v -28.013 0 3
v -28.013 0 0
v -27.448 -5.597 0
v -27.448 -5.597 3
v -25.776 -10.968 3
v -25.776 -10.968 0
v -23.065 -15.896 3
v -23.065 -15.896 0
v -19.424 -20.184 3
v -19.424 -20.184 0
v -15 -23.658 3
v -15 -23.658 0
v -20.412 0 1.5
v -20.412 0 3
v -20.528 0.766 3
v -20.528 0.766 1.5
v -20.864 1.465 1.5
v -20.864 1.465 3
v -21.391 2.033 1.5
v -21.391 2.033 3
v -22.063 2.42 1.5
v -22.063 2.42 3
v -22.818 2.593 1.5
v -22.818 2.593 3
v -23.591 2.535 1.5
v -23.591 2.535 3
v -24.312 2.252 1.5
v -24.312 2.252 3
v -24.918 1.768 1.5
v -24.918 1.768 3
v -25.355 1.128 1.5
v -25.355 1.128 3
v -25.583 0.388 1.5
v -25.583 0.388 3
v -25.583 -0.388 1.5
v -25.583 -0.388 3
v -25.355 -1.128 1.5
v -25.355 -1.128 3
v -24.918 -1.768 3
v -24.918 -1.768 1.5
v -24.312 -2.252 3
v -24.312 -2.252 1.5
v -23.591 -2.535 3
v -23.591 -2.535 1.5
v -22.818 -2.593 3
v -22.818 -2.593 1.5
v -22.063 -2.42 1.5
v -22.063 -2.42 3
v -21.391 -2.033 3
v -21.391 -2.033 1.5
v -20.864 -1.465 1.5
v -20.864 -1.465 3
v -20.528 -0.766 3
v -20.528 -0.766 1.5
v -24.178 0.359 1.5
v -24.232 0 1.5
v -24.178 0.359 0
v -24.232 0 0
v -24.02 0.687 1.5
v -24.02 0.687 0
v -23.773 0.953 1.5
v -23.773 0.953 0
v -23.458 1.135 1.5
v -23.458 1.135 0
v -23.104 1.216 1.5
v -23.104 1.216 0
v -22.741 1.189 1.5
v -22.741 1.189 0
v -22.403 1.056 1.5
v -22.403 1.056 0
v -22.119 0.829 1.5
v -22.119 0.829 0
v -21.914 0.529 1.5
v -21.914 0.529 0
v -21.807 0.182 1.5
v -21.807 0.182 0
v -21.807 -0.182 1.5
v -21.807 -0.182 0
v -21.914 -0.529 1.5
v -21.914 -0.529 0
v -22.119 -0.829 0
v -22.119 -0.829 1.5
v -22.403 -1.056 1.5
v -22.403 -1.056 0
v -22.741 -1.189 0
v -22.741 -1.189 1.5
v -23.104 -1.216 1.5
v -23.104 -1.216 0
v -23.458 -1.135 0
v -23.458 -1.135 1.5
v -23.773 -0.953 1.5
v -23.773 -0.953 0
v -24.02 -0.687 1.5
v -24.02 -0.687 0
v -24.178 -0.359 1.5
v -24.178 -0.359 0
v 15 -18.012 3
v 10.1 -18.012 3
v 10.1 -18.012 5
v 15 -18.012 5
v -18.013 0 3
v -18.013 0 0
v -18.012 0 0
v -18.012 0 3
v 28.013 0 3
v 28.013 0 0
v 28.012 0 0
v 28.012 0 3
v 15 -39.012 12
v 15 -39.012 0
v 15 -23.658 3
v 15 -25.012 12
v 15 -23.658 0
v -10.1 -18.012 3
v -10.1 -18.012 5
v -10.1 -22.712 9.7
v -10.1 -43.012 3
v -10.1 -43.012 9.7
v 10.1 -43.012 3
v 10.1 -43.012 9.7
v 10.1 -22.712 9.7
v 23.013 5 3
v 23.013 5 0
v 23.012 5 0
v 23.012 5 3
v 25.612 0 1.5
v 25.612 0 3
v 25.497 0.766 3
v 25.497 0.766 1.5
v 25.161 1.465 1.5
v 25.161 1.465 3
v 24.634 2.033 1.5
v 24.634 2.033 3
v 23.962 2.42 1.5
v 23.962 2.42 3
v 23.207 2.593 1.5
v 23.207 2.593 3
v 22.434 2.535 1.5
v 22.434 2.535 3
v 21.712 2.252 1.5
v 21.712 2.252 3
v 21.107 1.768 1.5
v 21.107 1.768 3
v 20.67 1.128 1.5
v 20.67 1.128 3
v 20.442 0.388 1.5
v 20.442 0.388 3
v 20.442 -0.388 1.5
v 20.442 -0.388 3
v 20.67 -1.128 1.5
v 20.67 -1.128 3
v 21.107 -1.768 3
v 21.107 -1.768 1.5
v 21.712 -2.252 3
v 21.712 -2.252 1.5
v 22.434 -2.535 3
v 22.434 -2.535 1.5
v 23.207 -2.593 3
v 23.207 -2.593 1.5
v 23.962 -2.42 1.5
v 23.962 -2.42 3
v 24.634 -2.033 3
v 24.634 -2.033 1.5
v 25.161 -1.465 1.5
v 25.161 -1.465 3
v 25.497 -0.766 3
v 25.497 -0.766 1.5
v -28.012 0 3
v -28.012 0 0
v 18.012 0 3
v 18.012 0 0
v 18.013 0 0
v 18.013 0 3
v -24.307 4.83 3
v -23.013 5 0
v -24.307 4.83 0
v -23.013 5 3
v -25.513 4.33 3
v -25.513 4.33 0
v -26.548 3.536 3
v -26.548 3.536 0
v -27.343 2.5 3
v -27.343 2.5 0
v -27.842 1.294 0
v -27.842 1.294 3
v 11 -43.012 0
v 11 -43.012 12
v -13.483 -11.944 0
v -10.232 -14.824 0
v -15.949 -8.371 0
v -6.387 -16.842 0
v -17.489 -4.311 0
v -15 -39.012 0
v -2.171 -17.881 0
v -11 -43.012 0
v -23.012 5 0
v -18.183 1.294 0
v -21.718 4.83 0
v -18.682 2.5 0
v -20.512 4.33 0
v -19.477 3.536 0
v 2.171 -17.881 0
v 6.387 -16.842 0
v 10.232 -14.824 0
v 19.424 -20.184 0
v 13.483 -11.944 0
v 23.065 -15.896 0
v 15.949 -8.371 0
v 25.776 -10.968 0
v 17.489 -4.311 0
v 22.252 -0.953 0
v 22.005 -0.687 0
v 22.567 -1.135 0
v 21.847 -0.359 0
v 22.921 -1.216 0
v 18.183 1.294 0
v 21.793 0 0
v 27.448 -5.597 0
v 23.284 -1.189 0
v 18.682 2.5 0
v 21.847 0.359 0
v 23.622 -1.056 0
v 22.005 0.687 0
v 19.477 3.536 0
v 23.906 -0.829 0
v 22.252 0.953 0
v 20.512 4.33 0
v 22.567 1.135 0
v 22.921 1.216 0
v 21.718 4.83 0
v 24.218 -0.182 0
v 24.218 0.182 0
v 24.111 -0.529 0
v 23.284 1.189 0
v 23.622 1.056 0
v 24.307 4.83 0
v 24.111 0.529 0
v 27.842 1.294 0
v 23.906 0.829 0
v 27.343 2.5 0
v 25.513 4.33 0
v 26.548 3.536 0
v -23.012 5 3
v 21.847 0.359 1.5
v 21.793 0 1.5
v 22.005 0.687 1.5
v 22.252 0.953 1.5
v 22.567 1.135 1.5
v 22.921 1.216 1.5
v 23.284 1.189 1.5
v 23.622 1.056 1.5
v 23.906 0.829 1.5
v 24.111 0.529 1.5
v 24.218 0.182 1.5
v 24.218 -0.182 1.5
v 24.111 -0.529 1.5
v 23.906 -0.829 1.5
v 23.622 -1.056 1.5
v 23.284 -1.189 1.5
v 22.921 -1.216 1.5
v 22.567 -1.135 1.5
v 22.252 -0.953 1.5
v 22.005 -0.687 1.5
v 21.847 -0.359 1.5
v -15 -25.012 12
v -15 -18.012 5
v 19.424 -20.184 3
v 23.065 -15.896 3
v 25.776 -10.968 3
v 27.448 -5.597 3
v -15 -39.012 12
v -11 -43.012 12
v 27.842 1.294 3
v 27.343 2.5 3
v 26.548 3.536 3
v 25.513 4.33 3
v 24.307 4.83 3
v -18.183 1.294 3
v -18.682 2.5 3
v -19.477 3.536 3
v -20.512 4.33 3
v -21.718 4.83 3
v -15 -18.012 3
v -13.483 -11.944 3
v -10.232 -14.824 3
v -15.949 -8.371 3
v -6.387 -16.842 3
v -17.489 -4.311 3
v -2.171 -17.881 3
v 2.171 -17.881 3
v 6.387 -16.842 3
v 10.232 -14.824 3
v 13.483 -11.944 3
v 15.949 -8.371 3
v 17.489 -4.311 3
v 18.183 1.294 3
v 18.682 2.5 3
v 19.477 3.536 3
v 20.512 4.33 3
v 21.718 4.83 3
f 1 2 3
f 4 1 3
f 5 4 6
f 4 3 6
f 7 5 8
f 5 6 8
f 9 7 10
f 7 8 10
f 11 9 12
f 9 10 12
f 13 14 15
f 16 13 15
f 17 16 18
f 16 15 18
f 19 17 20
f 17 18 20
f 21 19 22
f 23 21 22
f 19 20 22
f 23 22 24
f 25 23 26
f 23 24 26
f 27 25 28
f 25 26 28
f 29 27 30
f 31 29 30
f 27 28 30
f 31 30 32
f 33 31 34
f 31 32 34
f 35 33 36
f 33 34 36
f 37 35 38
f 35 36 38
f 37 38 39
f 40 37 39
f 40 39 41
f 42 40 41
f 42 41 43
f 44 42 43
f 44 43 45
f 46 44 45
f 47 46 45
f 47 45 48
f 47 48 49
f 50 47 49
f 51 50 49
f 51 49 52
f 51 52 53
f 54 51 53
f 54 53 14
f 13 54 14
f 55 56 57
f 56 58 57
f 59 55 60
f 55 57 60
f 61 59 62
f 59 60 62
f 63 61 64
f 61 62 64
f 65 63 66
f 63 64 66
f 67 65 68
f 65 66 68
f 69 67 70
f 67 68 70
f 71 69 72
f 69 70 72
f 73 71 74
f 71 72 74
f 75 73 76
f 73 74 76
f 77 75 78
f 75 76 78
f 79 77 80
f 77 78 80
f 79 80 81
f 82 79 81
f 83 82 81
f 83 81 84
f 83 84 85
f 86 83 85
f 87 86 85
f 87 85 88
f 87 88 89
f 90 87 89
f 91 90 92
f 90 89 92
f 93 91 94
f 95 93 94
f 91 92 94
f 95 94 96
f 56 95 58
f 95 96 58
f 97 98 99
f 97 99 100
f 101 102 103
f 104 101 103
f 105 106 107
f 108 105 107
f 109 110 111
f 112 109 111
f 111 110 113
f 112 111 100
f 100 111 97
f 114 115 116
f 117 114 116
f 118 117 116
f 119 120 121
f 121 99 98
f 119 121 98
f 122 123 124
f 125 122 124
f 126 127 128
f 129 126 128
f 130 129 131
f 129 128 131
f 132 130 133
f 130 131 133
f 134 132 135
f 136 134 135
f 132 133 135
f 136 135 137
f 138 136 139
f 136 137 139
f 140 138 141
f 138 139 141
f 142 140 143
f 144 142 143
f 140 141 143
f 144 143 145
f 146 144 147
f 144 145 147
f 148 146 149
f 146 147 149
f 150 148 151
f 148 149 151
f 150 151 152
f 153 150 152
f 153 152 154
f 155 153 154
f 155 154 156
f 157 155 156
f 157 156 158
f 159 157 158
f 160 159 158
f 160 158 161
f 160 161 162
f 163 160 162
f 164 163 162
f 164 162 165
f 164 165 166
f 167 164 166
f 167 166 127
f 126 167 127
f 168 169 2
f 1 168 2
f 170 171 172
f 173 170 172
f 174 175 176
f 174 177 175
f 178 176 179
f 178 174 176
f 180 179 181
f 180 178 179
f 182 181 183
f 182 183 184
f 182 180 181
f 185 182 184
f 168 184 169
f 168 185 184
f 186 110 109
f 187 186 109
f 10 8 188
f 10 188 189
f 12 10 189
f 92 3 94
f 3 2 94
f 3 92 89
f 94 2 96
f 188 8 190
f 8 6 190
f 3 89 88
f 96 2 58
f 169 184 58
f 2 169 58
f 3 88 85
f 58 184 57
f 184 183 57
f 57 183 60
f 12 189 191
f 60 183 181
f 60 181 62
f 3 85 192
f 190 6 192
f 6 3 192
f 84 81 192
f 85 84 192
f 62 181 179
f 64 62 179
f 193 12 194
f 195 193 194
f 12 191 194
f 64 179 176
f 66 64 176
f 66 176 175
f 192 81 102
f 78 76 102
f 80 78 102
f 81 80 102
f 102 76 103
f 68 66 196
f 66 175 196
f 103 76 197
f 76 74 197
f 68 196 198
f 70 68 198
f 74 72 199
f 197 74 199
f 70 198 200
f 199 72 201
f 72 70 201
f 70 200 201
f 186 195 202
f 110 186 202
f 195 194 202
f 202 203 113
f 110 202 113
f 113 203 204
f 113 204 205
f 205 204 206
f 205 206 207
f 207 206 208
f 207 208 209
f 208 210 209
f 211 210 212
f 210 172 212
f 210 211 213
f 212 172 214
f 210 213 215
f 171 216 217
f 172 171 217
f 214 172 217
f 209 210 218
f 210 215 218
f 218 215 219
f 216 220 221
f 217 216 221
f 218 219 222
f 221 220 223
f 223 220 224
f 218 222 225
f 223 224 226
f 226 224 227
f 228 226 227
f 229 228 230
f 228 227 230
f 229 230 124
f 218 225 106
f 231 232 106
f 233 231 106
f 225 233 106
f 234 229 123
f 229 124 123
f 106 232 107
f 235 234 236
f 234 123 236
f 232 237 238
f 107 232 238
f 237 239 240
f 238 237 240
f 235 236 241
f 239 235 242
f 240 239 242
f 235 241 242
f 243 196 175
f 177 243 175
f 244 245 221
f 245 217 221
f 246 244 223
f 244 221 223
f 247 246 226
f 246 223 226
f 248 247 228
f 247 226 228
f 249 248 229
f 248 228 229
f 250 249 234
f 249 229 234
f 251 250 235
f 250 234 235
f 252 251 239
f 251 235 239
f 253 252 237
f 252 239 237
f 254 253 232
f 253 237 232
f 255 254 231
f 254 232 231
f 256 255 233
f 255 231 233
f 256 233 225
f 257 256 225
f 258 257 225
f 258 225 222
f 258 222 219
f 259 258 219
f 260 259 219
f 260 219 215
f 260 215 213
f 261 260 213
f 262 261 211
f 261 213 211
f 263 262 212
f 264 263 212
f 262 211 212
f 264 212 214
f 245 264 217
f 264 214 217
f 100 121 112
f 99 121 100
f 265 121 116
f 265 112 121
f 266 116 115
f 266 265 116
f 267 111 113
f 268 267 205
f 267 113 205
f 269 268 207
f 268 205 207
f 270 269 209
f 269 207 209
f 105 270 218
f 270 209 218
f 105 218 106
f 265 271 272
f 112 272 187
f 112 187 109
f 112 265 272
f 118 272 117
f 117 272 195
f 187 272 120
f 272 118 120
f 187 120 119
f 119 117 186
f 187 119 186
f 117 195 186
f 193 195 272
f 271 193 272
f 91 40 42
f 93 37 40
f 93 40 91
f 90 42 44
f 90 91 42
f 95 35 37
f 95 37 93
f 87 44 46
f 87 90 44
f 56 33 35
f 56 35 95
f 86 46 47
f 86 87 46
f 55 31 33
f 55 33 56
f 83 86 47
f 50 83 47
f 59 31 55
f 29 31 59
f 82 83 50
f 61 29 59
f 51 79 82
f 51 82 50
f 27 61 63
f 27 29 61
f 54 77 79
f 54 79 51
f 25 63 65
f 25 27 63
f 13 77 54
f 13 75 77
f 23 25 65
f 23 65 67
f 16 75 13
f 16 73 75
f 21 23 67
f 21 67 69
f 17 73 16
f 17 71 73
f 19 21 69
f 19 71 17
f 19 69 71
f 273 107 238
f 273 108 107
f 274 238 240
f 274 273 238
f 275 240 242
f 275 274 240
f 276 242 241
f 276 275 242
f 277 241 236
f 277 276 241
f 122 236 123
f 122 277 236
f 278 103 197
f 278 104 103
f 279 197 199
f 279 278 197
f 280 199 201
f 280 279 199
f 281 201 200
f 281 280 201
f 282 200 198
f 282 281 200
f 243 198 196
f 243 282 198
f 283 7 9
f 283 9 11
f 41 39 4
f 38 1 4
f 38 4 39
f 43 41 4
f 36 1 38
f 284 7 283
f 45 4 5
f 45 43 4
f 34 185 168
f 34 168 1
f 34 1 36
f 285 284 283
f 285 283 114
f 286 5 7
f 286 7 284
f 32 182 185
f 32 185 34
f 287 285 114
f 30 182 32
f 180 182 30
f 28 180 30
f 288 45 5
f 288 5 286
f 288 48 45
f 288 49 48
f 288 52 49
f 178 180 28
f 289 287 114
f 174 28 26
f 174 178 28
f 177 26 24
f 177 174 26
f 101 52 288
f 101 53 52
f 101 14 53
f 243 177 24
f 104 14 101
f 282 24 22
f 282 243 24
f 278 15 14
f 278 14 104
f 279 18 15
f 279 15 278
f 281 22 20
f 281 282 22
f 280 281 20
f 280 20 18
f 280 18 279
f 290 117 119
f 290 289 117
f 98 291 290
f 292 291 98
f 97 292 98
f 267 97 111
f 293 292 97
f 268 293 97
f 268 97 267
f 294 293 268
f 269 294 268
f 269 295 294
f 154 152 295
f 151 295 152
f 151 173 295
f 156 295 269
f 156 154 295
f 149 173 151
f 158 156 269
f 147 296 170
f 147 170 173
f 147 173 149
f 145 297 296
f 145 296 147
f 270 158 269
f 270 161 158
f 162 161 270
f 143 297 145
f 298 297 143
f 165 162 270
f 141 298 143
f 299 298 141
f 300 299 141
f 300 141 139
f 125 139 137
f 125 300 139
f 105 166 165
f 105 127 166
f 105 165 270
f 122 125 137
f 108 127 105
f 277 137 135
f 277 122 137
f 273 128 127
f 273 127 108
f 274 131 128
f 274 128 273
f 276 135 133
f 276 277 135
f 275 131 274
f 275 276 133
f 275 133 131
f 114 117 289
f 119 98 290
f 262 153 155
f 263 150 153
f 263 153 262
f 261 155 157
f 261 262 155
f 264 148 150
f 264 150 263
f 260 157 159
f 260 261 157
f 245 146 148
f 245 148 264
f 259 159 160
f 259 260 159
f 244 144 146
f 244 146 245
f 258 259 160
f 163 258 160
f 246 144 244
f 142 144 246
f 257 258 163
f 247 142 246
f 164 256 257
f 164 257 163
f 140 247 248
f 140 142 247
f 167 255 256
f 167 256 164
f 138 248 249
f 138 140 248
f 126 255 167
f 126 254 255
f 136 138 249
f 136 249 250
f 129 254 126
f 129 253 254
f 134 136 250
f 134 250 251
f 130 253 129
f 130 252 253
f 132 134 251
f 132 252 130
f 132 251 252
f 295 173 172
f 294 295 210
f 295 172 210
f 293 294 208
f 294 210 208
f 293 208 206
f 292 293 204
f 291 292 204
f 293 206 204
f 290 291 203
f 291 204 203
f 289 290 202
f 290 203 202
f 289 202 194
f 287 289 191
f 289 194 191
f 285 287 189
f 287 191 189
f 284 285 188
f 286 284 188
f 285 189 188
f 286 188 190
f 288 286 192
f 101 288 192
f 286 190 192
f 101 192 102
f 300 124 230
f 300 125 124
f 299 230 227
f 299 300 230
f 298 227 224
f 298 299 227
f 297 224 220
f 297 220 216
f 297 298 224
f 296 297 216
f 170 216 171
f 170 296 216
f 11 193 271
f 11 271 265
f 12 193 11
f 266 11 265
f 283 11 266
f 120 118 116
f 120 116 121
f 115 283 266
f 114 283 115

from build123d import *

# Parameters (mm, degrees)
F1_DEPTH       = 3
F2_R           = 4.99999
F4_D           = 2.4384
F4_CBORE_D     = 5.2
F4_CBORE_DEPTH = 1.5
F5_W           = 30
F5_H           = 25
F6_DEPTH       = 12
F8_DEPTH       = 25.001
F9_T1_DEPTH    = 66.0035618315
F10_SIZE       = 4


# Not quite as in the source:
# - a fillet or chamfer that OpenCascade refuses, or shapes differently, is made with other operations: its cross-section is extruded or revolved along the edge and cut away or added
# - a fillet or chamfer is up to 0.001 mm smaller than in the source, because OpenCascade refuses the exact size


with BuildPart() as f1:
    # F0 (on Top) → F1 (new body)
    with BuildSketch(Plane.XY):
        with BuildLine():
            ThreePointArc((18.0125, 0), (0, -18.0125), (-18.0125, 0))
            Line((-18.0125, 0), (-18.0125, 5))
            Line((-18.0125, 5), (-28.0125, 5))
            Line((-28.0125, 5), (-28.0125, 0))
            ThreePointArc((-28.0125, 0), (0, -28.0125), (28.0125, 0))
            Line((28.0125, 0), (28.0125, 5))
            Line((28.0125, 5), (18.0125, 5))
            Line((18.0125, 5), (18.0125, 0))
        make_face()
    extrude(amount=F1_DEPTH)

    # F2 (radius 5 in the source; OpenCascade refuses exactly that, so slightly less here)
    f2_edges = [f1.edges().sort_by_distance(p)[0] for p in [
        (-28.0125, 5, 1.5),
        (-18.0125, 5, 1.5),
        (18.0125, 5, 1.5),
        (28.0125, 5, 1.5),
    ]]
    fillet(f2_edges, radius=F2_R)

    # F4 (through all)
    with Locations(Plane.XY.offset(3)):
        with Locations((-23.0125, 0), (23.0125, 0)):
            CounterBoreHole(F4_D / 2, F4_CBORE_D / 2, F4_CBORE_DEPTH)

    # F5 (on Top) → F6 (join)
    with BuildSketch(Plane.XY):
        with Locations((0, -30.5125)):
            Rectangle(F5_W, F5_H)
    extrude(amount=F6_DEPTH)

    # F7 (on face) → F8 (cut, through all)
    with BuildSketch(Plane(origin=(0, -18.0125, 0), x_dir=(-1, 0, 0), z_dir=(0, 1, 0))):
        Polygon((0, 3), (10.1, 3), (10.1, 9.7), (-10.1, 9.7), (-10.1, 3), align=None)
    extrude(amount=-F8_DEPTH, mode=Mode.SUBTRACT)

    # F9: chamfer of 7 on 1 edges, made by hand

    # F9_s2 → F9_t1 (cut)
    with BuildSketch(Plane.YZ.offset(-33.0017809158)):
        Polygon((-25.0125, 12), (-18.0125, 5), (-18.0125, 12), align=None)
    extrude(amount=F9_T1_DEPTH, mode=Mode.SUBTRACT)

    # F10
    f10_edges = [f1.edges().sort_by_distance(p)[0] for p in [
        (-15, -43.0125, 6),
        (15, -43.0125, 6),
    ]]
    chamfer(f10_edges, length=F10_SIZE)


solid = f1.part
